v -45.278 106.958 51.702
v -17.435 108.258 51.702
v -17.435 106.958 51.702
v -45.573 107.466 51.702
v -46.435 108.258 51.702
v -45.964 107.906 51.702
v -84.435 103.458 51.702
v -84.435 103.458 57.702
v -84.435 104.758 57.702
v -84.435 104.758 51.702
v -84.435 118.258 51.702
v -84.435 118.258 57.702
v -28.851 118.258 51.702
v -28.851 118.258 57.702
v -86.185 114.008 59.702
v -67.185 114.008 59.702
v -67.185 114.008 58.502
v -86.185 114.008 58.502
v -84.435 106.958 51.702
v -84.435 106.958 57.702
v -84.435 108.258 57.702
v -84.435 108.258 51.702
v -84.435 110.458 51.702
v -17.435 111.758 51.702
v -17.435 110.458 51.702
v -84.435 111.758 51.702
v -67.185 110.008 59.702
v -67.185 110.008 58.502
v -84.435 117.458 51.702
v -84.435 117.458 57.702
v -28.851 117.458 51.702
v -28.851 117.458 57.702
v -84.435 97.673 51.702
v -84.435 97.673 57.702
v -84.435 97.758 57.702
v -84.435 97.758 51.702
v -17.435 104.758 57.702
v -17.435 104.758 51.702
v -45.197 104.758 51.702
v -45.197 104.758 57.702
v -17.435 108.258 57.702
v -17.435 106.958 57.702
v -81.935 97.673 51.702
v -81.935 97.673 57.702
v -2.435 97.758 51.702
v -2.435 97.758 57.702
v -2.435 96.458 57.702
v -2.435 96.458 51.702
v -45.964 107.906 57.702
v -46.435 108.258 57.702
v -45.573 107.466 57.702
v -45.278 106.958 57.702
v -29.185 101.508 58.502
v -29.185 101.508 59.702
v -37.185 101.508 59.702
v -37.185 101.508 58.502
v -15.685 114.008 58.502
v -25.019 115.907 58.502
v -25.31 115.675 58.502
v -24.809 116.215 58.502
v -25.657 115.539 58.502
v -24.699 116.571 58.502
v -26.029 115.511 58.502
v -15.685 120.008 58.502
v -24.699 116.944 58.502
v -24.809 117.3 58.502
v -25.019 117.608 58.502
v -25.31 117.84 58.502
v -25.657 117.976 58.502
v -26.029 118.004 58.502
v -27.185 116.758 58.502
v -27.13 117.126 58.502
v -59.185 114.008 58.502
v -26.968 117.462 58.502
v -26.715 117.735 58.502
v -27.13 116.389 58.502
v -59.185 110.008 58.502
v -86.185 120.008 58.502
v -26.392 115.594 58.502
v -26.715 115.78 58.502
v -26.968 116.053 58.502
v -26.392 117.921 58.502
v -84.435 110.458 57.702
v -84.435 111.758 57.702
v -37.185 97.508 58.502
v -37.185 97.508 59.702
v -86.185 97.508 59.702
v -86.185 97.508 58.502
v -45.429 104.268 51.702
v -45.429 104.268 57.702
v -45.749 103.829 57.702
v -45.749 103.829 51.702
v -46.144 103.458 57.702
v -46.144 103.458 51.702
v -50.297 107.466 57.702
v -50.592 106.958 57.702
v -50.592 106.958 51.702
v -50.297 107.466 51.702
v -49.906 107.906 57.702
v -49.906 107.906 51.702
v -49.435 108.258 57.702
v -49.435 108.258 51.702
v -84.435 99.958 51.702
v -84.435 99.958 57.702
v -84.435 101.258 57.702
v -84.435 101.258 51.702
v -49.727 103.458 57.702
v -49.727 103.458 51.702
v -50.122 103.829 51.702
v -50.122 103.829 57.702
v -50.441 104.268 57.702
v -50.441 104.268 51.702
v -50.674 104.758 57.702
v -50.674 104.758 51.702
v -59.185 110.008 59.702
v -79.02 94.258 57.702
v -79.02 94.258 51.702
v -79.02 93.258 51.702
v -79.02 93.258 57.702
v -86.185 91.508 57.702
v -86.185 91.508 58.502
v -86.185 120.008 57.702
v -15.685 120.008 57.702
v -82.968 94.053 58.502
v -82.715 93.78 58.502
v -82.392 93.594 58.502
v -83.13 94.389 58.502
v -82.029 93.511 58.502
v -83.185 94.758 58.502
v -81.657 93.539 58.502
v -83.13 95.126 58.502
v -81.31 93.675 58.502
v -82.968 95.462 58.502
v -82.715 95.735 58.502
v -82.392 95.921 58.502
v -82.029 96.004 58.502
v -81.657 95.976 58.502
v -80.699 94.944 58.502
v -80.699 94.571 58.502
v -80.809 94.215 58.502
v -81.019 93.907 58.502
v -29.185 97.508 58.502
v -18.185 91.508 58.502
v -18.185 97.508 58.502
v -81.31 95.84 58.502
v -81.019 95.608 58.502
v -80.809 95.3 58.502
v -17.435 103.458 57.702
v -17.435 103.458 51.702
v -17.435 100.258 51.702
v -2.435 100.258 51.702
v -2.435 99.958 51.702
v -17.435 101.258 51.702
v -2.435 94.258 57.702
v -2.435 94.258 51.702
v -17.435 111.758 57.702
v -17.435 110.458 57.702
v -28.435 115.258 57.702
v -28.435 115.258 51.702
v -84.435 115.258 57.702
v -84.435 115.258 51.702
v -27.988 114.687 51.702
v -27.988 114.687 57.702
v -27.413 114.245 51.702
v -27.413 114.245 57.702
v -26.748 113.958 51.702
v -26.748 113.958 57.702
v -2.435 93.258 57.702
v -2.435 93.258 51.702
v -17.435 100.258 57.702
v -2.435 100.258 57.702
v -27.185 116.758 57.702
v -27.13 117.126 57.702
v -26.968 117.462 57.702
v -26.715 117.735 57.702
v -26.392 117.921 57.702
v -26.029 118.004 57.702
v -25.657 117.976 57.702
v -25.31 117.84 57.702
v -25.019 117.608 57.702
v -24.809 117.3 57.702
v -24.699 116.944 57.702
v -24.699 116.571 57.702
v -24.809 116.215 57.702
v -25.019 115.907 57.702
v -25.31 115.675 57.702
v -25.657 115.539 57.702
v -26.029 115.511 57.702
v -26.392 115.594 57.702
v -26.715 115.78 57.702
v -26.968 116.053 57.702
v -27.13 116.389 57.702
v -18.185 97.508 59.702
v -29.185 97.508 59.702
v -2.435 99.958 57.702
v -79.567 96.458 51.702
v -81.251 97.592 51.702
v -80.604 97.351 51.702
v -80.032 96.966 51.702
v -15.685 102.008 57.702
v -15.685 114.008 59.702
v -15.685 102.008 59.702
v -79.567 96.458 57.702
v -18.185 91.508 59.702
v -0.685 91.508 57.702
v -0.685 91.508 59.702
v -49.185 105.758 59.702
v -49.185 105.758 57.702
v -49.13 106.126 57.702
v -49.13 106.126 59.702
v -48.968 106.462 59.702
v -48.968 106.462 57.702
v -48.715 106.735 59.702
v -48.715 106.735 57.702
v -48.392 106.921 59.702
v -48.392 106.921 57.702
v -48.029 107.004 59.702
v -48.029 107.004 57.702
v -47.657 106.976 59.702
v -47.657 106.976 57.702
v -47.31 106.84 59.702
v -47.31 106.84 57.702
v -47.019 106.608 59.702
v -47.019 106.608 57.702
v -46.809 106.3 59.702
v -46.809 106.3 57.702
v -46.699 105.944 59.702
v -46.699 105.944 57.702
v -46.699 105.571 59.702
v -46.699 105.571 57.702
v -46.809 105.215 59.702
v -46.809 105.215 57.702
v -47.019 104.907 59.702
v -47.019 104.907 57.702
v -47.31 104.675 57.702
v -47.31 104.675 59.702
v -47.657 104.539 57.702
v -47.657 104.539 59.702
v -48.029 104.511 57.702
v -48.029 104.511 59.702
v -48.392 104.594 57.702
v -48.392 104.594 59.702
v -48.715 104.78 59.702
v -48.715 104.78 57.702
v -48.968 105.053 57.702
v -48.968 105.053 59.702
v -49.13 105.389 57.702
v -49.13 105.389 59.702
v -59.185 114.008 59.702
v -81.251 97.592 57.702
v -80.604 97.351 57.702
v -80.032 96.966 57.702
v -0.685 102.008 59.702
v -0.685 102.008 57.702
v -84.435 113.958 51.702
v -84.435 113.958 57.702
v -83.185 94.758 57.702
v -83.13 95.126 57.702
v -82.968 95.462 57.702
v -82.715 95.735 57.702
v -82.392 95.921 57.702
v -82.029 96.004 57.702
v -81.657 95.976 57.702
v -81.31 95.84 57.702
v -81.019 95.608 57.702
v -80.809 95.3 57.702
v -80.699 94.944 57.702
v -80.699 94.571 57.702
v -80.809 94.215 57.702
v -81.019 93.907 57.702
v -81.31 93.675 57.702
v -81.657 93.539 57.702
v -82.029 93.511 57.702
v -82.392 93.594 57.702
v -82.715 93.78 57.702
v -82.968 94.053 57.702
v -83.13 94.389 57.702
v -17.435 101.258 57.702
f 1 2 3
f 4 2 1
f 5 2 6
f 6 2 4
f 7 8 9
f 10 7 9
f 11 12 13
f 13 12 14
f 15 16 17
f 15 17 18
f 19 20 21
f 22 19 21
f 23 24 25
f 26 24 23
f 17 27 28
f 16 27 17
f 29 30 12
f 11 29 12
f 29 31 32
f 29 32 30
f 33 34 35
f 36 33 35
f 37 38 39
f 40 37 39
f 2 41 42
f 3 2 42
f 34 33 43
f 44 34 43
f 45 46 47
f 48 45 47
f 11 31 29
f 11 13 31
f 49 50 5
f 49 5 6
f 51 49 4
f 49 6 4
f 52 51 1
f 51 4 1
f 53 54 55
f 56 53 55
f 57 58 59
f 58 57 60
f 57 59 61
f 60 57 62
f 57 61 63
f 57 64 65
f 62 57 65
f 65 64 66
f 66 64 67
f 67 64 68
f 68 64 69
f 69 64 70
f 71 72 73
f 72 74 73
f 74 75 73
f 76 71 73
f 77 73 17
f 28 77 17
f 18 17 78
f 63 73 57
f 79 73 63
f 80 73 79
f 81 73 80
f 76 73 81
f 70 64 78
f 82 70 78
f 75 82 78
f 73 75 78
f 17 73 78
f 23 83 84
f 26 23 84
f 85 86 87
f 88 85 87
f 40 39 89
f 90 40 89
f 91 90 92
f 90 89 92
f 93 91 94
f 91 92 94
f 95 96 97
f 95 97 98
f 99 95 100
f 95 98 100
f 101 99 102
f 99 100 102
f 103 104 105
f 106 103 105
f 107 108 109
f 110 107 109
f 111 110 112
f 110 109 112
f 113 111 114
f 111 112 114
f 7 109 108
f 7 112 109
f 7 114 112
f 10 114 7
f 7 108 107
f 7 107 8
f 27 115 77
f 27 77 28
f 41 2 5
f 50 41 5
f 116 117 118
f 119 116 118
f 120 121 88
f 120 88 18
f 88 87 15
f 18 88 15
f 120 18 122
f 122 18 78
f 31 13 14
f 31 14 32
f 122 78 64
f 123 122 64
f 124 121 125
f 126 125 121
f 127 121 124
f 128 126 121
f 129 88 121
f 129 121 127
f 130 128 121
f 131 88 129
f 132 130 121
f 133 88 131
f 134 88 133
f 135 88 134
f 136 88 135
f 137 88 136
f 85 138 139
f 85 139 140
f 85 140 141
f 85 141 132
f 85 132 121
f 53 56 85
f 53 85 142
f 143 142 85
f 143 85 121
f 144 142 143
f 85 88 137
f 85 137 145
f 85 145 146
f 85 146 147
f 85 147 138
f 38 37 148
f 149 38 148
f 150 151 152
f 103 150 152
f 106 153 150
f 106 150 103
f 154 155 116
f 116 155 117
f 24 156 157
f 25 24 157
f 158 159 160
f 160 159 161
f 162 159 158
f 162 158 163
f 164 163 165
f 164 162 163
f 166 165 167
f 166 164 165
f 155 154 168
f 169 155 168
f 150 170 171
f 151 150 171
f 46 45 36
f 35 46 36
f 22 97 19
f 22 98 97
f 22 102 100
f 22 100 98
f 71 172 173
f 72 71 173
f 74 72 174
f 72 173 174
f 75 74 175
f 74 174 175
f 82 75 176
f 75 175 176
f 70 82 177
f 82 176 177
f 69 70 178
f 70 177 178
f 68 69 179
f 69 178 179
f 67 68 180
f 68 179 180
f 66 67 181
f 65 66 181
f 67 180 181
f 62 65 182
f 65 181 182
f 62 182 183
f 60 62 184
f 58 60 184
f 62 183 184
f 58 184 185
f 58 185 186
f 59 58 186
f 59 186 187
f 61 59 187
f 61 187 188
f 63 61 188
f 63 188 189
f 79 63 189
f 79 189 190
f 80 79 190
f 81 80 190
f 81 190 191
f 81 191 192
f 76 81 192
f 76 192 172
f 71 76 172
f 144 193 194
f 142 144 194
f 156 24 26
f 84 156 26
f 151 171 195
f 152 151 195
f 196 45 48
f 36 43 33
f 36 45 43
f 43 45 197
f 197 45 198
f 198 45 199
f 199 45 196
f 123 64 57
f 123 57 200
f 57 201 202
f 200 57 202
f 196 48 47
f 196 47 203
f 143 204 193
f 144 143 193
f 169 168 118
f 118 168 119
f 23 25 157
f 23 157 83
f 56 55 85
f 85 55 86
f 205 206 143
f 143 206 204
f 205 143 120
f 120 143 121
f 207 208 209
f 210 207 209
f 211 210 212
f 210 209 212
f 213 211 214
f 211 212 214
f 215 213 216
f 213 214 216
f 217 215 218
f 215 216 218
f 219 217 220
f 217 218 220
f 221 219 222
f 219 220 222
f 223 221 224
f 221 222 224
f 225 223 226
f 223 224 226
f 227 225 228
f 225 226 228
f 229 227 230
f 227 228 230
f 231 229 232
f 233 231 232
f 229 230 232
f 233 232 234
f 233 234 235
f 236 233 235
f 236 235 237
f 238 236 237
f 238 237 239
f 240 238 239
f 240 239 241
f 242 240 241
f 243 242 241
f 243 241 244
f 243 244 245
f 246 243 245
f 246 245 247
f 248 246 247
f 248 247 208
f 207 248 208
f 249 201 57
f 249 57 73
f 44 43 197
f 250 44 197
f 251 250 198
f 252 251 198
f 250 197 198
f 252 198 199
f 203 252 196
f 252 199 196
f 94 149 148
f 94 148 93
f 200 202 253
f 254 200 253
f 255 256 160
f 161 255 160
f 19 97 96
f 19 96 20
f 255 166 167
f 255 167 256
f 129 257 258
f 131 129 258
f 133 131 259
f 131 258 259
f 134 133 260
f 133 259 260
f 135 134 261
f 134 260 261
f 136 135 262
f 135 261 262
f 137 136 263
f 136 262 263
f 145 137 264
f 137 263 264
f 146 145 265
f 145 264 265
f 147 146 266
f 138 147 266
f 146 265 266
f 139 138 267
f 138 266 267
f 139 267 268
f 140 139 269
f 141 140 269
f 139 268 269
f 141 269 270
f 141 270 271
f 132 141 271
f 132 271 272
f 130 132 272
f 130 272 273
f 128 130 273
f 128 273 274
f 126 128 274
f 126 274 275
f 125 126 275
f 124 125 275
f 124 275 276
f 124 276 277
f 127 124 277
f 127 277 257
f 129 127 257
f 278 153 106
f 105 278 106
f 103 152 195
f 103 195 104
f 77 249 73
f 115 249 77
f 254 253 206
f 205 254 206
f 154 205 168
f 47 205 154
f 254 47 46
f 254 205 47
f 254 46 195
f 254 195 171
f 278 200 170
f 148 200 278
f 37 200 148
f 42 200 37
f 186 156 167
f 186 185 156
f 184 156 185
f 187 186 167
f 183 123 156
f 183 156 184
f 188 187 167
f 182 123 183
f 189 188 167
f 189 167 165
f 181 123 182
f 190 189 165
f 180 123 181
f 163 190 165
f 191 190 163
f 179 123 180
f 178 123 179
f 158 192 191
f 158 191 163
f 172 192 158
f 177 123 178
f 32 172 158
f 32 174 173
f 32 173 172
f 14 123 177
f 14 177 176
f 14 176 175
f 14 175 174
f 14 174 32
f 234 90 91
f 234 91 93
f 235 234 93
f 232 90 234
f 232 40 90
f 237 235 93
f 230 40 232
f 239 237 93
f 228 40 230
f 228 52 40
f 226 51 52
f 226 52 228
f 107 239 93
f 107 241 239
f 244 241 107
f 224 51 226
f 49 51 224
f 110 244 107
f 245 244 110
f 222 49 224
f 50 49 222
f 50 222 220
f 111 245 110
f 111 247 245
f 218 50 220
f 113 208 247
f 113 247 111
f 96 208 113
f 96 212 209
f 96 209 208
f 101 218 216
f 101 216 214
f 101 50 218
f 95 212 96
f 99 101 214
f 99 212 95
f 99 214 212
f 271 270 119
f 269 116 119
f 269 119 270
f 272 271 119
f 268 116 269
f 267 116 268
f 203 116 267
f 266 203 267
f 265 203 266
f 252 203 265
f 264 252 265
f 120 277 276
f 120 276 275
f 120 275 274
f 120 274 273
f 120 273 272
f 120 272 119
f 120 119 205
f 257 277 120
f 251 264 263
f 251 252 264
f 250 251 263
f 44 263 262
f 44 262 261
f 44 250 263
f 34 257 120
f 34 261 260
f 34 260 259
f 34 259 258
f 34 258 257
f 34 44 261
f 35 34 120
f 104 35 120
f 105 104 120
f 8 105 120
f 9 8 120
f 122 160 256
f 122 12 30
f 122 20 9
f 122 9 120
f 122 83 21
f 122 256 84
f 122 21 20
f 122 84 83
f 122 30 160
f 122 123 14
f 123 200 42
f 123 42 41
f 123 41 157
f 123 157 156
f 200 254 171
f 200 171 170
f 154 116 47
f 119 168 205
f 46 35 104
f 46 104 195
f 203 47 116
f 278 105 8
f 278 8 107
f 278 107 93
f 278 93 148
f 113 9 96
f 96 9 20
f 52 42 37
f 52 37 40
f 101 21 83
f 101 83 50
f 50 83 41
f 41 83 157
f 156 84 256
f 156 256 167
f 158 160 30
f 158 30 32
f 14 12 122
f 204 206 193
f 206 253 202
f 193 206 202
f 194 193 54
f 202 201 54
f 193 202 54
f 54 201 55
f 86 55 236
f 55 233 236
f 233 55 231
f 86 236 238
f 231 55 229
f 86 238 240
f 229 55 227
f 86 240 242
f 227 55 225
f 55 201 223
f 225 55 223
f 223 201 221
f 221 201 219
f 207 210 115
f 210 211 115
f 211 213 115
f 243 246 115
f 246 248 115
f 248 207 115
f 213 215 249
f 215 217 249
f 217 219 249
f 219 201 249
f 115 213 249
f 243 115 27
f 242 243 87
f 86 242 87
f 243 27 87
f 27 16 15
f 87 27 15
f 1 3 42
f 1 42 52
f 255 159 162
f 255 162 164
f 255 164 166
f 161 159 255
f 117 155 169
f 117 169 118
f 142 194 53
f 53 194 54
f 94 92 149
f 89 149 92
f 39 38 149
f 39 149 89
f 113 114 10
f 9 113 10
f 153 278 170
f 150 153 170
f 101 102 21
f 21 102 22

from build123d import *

# Parameters (mm, degrees)
BOSS_EXTRU_1_DEPTH      = 2
BOSS_EXTRU_2_DEPTH      = 6
ESQUISSE3_R             = 1.25
ENL_V_MAT_EXTRU_1_DEPTH = 148.965253472
ESQUISSE4_R             = 2.915475947
ENL_V_MAT_EXTRU_2_DEPTH = 6
ENL_V_MAT_EXTRU_3_DEPTH = 1.2
ESQUISSE12_W            = 85.5
ESQUISSE12_H            = 2.2
ENL_V_MAT_EXTRU_4_DEPTH = 6


with BuildPart() as part:
    # Esquisse1 → Boss.-Extru.1 (new body)
    with BuildSketch(Plane(origin=(0, 0, 59.701801036), x_dir=(-1, 0, 0), z_dir=(0, 0, -1))):
        Polygon((0.68526114, 91.507570583), (86.18526114, 91.507570583), (86.18526114, 120.007570583), (15.68526114, 120.007570583), (15.68526114, 102.007570583), (0.68526114, 102.007570583), align=None)
    extrude(amount=BOSS_EXTRU_1_DEPTH)

    # Esquisse2 → Boss.-Extru.2 (add)
    with BuildSketch(Plane(origin=(0, 0, 57.701801036), x_dir=(-1, 0, 0), z_dir=(0, 0, -1))):
        Polygon((84.43526114, 93.257570583), (84.43526114, 118.257570583), (17.43526114, 118.257570583), (17.43526114, 100.257570583), (2.43526114, 100.257570583), (2.43526114, 93.257570583), align=None)
    extrude(amount=BOSS_EXTRU_2_DEPTH)

    # Esquisse3 → Enlèv. mat.-Extru.1 (cut, through all)
    with BuildSketch(Plane(origin=(0, 0, 51.701801036), x_dir=(-1, 0, 0), z_dir=(0, 0, -1))):
        with Locations((47.93526114, 105.757570583)):
            Circle(ESQUISSE3_R)
        with Locations((25.93526114, 116.757570583)):
            Circle(ESQUISSE3_R)
        with Locations((81.93526114, 94.757570583)):
            Circle(ESQUISSE3_R)
    extrude(amount=-ENL_V_MAT_EXTRU_1_DEPTH, mode=Mode.SUBTRACT)

    # Esquisse4 → Enlèv. mat.-Extru.2 (cut)
    with BuildSketch(Plane(origin=(0, 0, 51.701801036), x_dir=(-1, 0, 0), z_dir=(0, 0, -1))):
        with Locations((47.93526114, 105.757570583)):
            Circle(ESQUISSE4_R)
        with BuildLine():
            Line((25.93526114, 113.842094636), (17.43526114, 113.842094636))
            Line((17.43526114, 113.842094636), (17.43526114, 118.257570583))
            Line((17.43526114, 118.257570583), (28.850737087, 118.257570583))
            Line((28.850737087, 118.257570583), (28.850737087, 116.757570583))
            ThreePointArc((28.850737087, 116.757570583), (27.996813953, 114.696017771), (25.93526114, 113.842094636))
        make_face()
        with BuildLine():
            Line((79.019785192, 94.757570583), (79.019785192, 91.842094636))
            Line((79.019785192, 91.842094636), (84.850737087, 91.842094636))
            Line((84.850737087, 91.842094636), (84.850737087, 97.673046531))
            Line((84.850737087, 97.673046531), (81.93526114, 97.673046531))
            ThreePointArc((81.93526114, 97.673046531), (79.873708327, 96.819123396), (79.019785192, 94.757570583))
        make_face()
    extrude(amount=-ENL_V_MAT_EXTRU_2_DEPTH, mode=Mode.SUBTRACT)

    # Esquisse11 → Enlèv. mat.-Extru.3 (cut)
    with BuildSketch(Plane.XY.offset(59.701801036)):
        Polygon((-18.18526114, 91.507570583), (-18.18526114, 97.507570583), (-29.18526114, 97.507570583), (-29.18526114, 101.507570583), (-37.18526114, 101.507570583), (-37.18526114, 97.507570583), (-86.18526114, 97.507570583), (-86.18526114, 91.507570583), align=None)
        Polygon((-15.68526114, 114.007570583), (-59.18526114, 114.007570583), (-59.18526114, 110.007570583), (-67.18526114, 110.007570583), (-67.18526114, 114.007570583), (-86.18526114, 114.007570583), (-86.18526114, 120.007570583), (-15.68526114, 120.007570583), align=None)
    extrude(amount=-ENL_V_MAT_EXTRU_3_DEPTH, mode=Mode.SUBTRACT)

    # Esquisse12 → Enlèv. mat.-Extru.4 (cut)
    with BuildSketch(Plane(origin=(0, 0, 51.701801036), x_dir=(-1, 0, 0), z_dir=(0, 0, -1))):
        with Locations((43.43526114, 95.357570583)):
            Rectangle(ESQUISSE12_W, ESQUISSE12_H)
        with Locations((43.43526114, 98.857570583)):
            Rectangle(ESQUISSE12_W, ESQUISSE12_H)
        with Locations((43.43526114, 102.357570583)):
            Rectangle(ESQUISSE12_W, ESQUISSE12_H)
        with Locations((43.43526114, 105.857570583)):
            Rectangle(ESQUISSE12_W, ESQUISSE12_H)
        with Locations((43.43526114, 109.357570583)):
            Rectangle(ESQUISSE12_W, ESQUISSE12_H)
        with Locations((43.43526114, 112.857570583)):
            Rectangle(ESQUISSE12_W, ESQUISSE12_H)
        with Locations((43.43526114, 116.357570583)):
            Rectangle(ESQUISSE12_W, ESQUISSE12_H)
    extrude(amount=-ENL_V_MAT_EXTRU_4_DEPTH, mode=Mode.SUBTRACT)


solid = part.part
